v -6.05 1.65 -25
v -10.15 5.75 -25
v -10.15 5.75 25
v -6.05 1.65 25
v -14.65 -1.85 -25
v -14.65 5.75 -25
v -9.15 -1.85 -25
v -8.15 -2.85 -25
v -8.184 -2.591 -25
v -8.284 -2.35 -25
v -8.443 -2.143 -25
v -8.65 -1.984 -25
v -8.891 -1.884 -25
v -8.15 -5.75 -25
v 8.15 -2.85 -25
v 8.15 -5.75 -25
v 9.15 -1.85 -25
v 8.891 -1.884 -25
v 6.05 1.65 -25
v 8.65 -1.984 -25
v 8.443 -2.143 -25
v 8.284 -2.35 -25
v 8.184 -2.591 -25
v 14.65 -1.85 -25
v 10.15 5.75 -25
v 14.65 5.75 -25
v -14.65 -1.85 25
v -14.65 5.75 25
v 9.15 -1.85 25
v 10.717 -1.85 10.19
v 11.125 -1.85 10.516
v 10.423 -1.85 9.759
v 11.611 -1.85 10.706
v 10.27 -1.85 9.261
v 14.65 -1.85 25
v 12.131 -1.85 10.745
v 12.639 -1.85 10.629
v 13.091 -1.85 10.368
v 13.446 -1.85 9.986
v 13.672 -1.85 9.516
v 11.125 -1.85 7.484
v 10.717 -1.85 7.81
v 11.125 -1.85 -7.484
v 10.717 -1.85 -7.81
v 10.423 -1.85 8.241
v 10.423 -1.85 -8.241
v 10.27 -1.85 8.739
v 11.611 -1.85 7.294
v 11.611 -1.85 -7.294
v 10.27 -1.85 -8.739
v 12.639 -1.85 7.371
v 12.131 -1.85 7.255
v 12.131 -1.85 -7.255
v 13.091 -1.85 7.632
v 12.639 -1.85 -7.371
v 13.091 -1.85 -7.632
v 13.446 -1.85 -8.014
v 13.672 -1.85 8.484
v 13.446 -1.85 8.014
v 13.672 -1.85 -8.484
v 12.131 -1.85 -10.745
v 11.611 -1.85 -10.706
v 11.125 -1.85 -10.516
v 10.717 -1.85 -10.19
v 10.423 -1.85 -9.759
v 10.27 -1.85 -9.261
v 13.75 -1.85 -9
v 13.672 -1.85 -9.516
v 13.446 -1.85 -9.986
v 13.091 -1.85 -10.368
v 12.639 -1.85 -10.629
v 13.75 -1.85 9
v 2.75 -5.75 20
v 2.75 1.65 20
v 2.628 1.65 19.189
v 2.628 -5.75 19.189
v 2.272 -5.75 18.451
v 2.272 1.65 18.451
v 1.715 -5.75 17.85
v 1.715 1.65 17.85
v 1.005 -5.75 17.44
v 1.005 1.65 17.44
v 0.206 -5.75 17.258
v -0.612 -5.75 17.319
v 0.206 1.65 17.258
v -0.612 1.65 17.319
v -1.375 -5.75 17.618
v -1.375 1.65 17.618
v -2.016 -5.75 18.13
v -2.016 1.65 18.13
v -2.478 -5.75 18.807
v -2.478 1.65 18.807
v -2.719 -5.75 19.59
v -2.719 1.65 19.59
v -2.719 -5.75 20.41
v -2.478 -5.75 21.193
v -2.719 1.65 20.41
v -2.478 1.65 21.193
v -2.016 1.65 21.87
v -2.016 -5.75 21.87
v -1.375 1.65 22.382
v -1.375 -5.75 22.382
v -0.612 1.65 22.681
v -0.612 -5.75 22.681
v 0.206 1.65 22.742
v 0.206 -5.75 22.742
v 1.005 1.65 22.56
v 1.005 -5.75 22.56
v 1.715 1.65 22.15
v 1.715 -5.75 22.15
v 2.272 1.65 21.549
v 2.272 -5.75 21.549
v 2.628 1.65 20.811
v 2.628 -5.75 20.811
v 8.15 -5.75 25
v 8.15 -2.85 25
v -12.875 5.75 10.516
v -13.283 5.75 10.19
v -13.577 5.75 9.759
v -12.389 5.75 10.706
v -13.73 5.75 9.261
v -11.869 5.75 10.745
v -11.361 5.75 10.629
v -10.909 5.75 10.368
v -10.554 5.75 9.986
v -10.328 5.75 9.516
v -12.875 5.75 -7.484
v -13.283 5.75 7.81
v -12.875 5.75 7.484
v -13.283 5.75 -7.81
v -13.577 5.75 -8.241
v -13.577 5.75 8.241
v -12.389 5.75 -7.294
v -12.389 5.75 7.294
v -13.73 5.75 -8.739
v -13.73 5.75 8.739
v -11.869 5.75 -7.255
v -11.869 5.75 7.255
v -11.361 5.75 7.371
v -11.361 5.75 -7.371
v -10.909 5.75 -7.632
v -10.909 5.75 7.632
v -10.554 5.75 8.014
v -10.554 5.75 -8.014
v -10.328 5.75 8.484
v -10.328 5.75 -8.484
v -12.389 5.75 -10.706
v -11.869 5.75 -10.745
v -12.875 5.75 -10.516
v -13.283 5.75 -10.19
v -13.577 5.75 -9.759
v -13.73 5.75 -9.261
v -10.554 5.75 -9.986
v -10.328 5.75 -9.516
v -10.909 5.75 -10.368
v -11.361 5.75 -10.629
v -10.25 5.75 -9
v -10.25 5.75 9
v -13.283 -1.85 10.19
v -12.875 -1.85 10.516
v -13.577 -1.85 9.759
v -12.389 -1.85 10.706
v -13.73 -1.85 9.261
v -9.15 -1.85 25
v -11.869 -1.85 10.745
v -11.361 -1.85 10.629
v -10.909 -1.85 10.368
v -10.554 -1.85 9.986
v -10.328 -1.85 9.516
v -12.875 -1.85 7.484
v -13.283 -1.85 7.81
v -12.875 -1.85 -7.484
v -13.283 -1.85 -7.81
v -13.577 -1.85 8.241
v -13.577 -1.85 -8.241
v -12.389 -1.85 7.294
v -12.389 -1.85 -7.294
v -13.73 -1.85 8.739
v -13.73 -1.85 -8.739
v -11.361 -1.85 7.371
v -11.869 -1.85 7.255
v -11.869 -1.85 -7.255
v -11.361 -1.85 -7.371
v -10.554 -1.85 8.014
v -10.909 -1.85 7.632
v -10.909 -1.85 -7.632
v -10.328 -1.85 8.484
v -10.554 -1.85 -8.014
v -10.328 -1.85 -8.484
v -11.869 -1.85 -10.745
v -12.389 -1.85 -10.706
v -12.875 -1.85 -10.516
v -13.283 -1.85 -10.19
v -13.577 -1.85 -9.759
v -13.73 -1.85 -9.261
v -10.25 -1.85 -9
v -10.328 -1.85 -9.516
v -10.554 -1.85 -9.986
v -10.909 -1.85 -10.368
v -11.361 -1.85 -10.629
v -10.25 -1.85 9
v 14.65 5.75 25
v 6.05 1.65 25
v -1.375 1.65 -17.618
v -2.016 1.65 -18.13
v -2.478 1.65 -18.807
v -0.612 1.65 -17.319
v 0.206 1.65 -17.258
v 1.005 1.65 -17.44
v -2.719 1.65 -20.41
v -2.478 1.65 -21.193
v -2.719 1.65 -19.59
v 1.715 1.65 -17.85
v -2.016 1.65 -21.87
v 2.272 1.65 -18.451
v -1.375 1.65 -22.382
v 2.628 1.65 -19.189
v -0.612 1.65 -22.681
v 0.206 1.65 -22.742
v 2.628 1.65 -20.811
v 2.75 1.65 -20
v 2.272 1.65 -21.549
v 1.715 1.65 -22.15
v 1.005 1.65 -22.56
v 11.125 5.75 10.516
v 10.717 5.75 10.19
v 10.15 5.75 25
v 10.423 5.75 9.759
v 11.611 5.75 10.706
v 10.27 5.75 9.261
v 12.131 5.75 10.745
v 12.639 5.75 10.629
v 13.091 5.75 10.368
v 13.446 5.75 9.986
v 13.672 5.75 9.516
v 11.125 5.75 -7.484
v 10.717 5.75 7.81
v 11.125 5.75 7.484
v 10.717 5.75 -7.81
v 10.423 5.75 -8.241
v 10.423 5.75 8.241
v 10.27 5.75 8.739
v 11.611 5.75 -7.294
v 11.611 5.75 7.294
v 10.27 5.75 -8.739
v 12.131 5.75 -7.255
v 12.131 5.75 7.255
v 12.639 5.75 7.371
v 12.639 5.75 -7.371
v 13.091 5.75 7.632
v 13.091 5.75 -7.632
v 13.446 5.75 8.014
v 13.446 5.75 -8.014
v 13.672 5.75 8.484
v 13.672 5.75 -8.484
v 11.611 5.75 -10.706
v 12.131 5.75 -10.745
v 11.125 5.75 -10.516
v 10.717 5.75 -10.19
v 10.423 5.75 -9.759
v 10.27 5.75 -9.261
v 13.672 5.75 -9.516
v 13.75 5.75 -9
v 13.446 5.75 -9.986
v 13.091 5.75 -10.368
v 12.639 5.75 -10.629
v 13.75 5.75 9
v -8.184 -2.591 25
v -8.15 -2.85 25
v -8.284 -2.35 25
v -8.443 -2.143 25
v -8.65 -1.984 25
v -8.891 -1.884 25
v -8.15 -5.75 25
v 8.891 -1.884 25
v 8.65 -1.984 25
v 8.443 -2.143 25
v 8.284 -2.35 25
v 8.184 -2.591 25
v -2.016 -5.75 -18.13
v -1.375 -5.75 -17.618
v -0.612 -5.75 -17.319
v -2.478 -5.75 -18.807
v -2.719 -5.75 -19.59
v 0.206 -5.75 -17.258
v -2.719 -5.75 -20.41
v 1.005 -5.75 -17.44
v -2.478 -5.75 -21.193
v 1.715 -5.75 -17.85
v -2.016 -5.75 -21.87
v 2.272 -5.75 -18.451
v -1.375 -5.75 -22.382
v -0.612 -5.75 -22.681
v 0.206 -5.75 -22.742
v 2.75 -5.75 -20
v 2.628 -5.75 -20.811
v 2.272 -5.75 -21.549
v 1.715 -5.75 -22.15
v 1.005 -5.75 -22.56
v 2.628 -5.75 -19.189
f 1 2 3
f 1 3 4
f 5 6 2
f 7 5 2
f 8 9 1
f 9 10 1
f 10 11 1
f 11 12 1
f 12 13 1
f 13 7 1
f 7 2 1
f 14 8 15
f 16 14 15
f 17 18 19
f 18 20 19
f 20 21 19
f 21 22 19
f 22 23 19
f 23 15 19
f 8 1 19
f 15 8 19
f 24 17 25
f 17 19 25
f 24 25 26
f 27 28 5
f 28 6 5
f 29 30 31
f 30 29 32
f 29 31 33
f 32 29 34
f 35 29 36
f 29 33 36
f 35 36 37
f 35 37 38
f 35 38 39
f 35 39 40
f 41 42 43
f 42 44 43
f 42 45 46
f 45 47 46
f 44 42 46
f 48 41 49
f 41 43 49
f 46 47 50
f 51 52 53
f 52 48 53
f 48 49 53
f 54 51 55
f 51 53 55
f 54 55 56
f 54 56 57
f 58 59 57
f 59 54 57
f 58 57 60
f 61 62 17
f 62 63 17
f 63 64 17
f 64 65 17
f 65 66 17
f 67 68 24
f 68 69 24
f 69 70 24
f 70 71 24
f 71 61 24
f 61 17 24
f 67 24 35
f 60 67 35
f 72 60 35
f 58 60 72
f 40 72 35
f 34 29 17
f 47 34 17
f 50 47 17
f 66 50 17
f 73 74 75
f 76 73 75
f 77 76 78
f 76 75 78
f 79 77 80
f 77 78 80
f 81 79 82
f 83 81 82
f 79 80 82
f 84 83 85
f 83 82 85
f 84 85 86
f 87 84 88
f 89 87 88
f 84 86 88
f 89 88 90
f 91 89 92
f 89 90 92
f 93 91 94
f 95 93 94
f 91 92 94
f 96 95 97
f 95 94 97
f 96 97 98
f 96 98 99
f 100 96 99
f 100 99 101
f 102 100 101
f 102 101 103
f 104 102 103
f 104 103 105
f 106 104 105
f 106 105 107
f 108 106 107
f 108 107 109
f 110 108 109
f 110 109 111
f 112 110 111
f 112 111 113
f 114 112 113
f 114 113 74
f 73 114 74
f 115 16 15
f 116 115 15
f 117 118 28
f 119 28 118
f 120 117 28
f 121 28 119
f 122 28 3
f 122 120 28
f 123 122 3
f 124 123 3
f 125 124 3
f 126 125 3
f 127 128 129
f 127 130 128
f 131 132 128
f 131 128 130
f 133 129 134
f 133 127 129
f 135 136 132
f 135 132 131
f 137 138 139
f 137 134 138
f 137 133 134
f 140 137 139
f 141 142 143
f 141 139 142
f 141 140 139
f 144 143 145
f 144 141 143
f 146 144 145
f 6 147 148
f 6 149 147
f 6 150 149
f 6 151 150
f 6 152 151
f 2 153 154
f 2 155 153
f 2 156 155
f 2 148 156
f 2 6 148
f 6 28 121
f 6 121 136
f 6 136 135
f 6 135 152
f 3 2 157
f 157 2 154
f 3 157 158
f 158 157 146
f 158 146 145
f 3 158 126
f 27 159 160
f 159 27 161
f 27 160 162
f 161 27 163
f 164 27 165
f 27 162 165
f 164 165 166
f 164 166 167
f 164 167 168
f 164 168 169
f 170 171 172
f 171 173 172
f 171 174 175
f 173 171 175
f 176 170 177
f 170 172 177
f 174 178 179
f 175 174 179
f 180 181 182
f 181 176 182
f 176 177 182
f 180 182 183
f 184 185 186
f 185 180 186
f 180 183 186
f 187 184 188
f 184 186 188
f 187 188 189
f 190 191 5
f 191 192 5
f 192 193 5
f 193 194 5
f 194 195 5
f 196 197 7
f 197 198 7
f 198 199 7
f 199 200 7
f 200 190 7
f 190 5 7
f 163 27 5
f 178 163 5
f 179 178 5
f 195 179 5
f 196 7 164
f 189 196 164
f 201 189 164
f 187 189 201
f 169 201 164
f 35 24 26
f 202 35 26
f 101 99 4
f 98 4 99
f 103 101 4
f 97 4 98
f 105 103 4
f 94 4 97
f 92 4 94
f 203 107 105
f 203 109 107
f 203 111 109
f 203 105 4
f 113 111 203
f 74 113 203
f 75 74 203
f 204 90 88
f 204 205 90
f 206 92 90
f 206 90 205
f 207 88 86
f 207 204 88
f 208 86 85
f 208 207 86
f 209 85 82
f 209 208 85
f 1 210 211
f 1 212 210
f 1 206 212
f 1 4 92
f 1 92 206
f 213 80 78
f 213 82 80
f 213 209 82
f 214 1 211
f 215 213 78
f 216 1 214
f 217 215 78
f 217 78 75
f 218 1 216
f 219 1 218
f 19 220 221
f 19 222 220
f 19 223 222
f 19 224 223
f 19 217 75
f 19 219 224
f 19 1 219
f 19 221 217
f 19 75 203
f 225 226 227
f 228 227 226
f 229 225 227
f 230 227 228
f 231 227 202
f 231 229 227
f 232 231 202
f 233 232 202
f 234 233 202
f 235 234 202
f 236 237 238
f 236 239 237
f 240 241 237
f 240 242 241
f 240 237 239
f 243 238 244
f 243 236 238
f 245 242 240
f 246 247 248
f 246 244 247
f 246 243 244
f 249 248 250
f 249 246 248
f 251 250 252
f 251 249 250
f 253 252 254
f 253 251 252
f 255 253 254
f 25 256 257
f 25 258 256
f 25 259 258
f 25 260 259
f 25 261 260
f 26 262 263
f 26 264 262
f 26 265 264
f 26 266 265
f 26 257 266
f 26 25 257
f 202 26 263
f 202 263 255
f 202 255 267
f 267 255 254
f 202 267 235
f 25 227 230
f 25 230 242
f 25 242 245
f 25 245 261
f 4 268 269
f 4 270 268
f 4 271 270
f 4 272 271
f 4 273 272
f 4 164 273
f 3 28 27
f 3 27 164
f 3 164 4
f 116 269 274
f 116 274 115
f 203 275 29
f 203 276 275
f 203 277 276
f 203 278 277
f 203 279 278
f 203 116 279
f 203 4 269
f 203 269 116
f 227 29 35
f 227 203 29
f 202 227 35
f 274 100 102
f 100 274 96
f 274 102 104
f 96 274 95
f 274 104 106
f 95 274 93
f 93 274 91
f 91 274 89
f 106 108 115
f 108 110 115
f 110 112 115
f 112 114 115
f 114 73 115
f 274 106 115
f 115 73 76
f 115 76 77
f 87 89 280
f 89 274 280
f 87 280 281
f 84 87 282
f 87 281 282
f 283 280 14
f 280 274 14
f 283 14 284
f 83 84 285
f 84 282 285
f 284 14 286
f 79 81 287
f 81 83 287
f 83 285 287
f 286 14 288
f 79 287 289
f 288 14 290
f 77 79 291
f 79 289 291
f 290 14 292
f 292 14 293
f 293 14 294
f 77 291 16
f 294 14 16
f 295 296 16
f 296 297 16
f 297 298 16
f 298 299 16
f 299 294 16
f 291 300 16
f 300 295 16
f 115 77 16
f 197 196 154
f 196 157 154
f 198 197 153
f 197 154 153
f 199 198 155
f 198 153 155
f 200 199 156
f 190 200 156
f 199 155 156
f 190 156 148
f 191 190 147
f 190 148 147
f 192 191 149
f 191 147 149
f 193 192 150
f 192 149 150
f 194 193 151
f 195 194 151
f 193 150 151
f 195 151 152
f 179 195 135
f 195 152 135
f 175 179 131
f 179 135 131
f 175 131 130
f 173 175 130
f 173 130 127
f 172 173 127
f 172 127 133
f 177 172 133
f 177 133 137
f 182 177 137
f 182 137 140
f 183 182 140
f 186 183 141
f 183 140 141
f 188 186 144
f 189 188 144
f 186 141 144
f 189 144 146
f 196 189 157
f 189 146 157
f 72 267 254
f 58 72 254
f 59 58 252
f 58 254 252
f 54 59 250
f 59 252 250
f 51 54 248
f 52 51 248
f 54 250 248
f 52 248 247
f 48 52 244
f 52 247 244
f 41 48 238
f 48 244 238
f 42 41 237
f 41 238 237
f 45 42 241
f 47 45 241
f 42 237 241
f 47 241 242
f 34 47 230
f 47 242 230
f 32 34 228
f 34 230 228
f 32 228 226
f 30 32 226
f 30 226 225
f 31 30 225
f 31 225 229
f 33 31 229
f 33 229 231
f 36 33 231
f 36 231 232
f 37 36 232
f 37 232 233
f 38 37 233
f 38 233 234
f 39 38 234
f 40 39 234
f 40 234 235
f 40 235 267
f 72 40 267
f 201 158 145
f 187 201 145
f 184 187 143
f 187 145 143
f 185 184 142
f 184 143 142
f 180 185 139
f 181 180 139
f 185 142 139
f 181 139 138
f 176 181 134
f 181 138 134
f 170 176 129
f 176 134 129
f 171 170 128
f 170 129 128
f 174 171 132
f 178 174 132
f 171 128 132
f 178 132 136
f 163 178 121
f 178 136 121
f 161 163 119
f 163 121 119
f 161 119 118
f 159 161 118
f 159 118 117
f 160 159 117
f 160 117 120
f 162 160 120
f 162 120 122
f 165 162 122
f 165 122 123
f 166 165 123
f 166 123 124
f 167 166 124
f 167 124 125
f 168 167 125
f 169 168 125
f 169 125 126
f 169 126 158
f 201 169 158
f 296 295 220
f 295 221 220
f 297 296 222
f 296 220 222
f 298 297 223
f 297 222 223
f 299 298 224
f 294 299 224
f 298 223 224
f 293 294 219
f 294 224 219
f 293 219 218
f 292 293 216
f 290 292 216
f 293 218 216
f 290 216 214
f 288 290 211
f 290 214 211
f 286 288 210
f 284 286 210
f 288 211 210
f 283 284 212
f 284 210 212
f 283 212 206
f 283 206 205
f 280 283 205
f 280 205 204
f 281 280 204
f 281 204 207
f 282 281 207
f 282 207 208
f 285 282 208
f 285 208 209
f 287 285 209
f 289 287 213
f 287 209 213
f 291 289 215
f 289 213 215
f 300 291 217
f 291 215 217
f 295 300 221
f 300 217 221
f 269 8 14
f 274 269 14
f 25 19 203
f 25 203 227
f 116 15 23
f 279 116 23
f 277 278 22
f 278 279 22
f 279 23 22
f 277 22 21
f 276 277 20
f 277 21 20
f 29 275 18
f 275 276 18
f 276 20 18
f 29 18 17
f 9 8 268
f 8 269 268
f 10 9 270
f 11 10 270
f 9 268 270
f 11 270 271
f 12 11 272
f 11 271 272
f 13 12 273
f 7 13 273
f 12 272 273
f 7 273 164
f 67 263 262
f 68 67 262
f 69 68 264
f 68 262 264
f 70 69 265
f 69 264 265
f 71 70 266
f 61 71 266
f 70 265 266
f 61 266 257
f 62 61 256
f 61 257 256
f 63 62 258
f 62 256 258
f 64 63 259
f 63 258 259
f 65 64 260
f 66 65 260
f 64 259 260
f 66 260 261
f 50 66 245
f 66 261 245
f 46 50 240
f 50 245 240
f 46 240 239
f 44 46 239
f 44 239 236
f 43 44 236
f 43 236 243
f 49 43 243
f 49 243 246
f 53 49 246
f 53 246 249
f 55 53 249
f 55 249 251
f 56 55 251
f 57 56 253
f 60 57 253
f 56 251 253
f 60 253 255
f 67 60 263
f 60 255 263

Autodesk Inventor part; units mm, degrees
ref_plane "YZ Plane" through (0, 0, 0) normal (1, 0, 0) x (0, 1, 0)
ref_plane "XZ Plane" through (0, 0, 0) normal (0, 1, 0) x (-1, 0, 0)
ref_plane "XY Plane" through (0, 0, 0) normal (0, 0, 1) x (1, 0, 0)
sketch "Sketch1" plane through (0, 0, 0) normal (0, 0, 1) x (1, 0, 0)
  line L0 (-14.65, 5.75) -> (-10.15, 5.75)
  line L1 (-10.15, 5.75) -> (-6.05, 1.65)
  line L2 (-6.05, 1.65) -> (6.05, 1.65)
  line L3 (6.05, 1.65) -> (10.15, 5.75)
  line L4 (10.15, 5.75) -> (14.65, 5.75)
  line L5 (-14.65, 5.75) -> (-14.65, -1.85)
  line L6 (-14.65, -1.85) -> (-8.15, -1.85)
  line L7 (-8.15, -1.85) -> (-8.15, -5.75)
  line L8 (-8.15, -5.75) -> (8.15, -5.75)
  line L9 (8.15, -5.75) -> (8.15, -1.85)
  line L10 (8.15, -1.85) -> (14.65, -1.85)
  line L11 (14.65, -1.85) -> (14.65, 5.75)
  line L12 (0, -5.75) -> (0, 5.75) construction
  point P0 (0, 0)
  point P1 (0, 0)
  dimension "d0" = 12.1
  dimension "d1" = 4.5
  dimension "d2" = 135
  dimension "d3" = 7.6
  dimension "d4" = 6.5
  dimension "d6" = 4.1
  dimension "d29" = 11.5
extrude "Extrusion1" add sketch "Sketch1" along normal mid plane 50
sketch "Sketch2" plane through (-14.65, 5.75, 25) normal (0, 1, 0) x (1, 0, 0)
  circle A0 centre (2.65, 34) radius 1.75
  line L0 (-5.86, 25) -> (35.16, 25) projected
  line L1 (14.65, 60) -> (14.65, -10) projected
  circle A1 centre (26.65, 34) radius 1.75
  circle A2 centre (2.65, 16) radius 1.75
  circle A3 centre (26.65, 16) radius 1.75
  line L2 (2.65, 16) -> (26.65, 16) construction
  line L3 (26.65, 16) -> (26.65, 34) construction
  line L4 (26.65, 34) -> (2.65, 34) construction
  line L5 (2.65, 34) -> (2.65, 16) construction
  point P0 (14.65, 25)
  point P1 (2.65, 25)
  point P2 (14.65, 34)
  dimension "d11" = 24
  dimension "d14" = 18
  dimension "d17" = 3.5
extrude "Extrusion2" cut sketch "Sketch2" against normal through all
sketch "Sketch3" plane through (-6.05, 1.65, 25) normal (0, 1, 0) x (1, 0, 0)
  circle A0 centre (6.05, 45) radius 2.75
  circle A1 centre (6.05, 5) radius 2.75
  line L0 (6.05, 5) -> (6.05, 45) construction
  line L1 (1.7705, 10) -> (10.3295, 10)
  line L2 (10.3295, 10) -> (10.3295, 40)
  line L3 (10.3295, 40) -> (1.7705, 40)
  line L4 (1.7705, 40) -> (1.7705, 10)
  line L5 (1.7705, 10) -> (10.3295, 40) construction
  line L6 (10.3295, 10) -> (1.7705, 40) construction
  circle A2 centre (6.05, 45) radius 4.25 construction
  point P0 (6.05, 25)
  point P1 (6.05, 25)
  dimension "d21" = 5.5
  dimension "d23" = 40
  dimension "d24" = 30
  dimension "d25" = 8.5
extrude "Extrusion3" cut sketch "Sketch3" against normal through all contours A0 | A1
fillet "Fillet2" radius 1 2 edges at (8.15, -1.85, 0) (-8.15, -1.85, 0)
properties part number "Acople_rodamiento_lineal"
